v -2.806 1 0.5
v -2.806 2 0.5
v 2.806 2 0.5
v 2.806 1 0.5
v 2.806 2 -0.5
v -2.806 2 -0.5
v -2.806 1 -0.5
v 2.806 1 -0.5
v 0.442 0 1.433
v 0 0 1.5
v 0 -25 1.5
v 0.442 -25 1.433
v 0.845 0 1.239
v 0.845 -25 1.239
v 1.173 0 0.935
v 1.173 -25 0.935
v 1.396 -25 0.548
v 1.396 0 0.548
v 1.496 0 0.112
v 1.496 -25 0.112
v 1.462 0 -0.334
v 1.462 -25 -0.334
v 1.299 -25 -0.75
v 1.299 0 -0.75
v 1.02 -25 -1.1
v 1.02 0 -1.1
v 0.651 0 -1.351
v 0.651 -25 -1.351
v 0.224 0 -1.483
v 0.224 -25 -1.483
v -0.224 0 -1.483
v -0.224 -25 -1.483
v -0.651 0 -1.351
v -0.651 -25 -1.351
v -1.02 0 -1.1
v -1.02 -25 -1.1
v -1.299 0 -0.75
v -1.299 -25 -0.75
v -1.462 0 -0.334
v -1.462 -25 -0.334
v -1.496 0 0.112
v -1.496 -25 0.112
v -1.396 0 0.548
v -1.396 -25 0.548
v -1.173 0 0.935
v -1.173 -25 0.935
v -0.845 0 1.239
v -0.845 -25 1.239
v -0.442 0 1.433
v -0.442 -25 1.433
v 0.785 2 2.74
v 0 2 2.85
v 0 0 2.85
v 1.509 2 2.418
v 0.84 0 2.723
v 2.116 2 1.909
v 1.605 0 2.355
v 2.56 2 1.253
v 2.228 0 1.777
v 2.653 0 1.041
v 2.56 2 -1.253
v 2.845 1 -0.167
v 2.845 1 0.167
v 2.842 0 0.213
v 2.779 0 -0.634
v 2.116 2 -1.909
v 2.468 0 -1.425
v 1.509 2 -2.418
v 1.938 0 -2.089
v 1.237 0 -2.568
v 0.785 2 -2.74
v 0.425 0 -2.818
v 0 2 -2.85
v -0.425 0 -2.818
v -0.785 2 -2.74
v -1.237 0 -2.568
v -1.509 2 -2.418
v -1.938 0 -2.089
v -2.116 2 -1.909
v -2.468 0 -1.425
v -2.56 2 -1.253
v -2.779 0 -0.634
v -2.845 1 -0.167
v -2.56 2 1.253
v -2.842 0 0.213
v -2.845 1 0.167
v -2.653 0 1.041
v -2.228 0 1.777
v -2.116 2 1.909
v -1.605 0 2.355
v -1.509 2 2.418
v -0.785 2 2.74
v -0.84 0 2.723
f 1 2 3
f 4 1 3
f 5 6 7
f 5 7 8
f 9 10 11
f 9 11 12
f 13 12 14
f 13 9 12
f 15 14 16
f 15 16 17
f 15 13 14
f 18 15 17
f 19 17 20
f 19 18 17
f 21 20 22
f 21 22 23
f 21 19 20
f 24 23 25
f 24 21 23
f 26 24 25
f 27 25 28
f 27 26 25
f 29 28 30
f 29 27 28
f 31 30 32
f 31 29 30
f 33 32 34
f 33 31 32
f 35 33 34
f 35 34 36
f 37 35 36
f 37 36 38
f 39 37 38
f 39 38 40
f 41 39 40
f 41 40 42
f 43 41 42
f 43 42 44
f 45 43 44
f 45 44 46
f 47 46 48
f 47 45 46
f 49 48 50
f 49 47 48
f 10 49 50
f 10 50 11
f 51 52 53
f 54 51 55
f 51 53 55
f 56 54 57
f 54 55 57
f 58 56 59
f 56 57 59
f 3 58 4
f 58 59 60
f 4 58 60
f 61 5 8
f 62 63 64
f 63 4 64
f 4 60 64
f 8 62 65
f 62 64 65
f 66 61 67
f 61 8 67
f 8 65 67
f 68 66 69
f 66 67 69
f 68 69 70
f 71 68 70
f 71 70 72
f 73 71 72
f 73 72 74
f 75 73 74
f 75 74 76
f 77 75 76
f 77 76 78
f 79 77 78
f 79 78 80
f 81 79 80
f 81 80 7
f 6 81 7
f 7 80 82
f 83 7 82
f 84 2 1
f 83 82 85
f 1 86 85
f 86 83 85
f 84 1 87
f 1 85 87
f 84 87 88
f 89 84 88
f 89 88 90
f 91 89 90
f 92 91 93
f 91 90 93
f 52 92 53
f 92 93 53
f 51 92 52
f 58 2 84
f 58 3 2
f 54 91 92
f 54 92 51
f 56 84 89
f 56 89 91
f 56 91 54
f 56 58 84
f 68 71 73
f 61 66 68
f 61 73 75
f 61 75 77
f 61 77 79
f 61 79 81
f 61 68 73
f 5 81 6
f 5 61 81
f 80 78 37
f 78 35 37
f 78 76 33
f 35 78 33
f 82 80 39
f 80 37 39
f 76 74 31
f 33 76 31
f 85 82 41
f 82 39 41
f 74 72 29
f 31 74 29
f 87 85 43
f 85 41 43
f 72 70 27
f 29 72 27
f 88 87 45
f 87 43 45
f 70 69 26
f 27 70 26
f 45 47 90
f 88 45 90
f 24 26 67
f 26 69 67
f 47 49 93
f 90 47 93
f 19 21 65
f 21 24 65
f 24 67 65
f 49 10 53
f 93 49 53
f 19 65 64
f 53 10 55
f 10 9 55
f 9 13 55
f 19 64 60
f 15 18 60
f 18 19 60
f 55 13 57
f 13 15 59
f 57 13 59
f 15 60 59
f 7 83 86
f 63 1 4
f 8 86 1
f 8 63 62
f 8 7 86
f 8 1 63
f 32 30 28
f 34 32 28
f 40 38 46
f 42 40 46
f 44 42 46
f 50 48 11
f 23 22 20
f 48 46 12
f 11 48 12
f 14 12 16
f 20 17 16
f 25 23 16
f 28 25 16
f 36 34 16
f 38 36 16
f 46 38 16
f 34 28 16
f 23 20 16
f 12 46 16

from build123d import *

# Parameters (mm, degrees)
SKETCH1_R           = 2.85
BOSS_EXTRUDE1_DEPTH = 2
SKETCH2_R           = 1.5
BOSS_EXTRUDE2_DEPTH = 25
SKETCH3_W           = 6
SKETCH3_H           = 1
CUT_EXTRUDE1_DEPTH  = 1


with BuildPart() as part:
    # Sketch1 → Boss-Extrude1 (new body)
    with BuildSketch(Plane(origin=(0, 0, 0), x_dir=(1, 0, 0), z_dir=(0, 1, 0))):
        with Locations(Location((0, 0, 0), (0, 0, 270))):
            Circle(SKETCH1_R)
    extrude(amount=BOSS_EXTRUDE1_DEPTH)

    # Sketch2 → Boss-Extrude2 (add)
    with BuildSketch(Plane(origin=(0, 0, 0), x_dir=(1, 0, 0), z_dir=(0, 1, 0))):
        with Locations(Location((0, 0, 0), (0, 0, 270))):
            Circle(SKETCH2_R)
    extrude(amount=-BOSS_EXTRUDE2_DEPTH)

    # Sketch3 → Cut-Extrude1 (cut)
    with BuildSketch(Plane(origin=(0, 2, 0), x_dir=(1, 0, 0), z_dir=(0, 1, 0))):
        Rectangle(SKETCH3_W, SKETCH3_H)
    extrude(amount=-CUT_EXTRUDE1_DEPTH, mode=Mode.SUBTRACT)


solid = part.part
